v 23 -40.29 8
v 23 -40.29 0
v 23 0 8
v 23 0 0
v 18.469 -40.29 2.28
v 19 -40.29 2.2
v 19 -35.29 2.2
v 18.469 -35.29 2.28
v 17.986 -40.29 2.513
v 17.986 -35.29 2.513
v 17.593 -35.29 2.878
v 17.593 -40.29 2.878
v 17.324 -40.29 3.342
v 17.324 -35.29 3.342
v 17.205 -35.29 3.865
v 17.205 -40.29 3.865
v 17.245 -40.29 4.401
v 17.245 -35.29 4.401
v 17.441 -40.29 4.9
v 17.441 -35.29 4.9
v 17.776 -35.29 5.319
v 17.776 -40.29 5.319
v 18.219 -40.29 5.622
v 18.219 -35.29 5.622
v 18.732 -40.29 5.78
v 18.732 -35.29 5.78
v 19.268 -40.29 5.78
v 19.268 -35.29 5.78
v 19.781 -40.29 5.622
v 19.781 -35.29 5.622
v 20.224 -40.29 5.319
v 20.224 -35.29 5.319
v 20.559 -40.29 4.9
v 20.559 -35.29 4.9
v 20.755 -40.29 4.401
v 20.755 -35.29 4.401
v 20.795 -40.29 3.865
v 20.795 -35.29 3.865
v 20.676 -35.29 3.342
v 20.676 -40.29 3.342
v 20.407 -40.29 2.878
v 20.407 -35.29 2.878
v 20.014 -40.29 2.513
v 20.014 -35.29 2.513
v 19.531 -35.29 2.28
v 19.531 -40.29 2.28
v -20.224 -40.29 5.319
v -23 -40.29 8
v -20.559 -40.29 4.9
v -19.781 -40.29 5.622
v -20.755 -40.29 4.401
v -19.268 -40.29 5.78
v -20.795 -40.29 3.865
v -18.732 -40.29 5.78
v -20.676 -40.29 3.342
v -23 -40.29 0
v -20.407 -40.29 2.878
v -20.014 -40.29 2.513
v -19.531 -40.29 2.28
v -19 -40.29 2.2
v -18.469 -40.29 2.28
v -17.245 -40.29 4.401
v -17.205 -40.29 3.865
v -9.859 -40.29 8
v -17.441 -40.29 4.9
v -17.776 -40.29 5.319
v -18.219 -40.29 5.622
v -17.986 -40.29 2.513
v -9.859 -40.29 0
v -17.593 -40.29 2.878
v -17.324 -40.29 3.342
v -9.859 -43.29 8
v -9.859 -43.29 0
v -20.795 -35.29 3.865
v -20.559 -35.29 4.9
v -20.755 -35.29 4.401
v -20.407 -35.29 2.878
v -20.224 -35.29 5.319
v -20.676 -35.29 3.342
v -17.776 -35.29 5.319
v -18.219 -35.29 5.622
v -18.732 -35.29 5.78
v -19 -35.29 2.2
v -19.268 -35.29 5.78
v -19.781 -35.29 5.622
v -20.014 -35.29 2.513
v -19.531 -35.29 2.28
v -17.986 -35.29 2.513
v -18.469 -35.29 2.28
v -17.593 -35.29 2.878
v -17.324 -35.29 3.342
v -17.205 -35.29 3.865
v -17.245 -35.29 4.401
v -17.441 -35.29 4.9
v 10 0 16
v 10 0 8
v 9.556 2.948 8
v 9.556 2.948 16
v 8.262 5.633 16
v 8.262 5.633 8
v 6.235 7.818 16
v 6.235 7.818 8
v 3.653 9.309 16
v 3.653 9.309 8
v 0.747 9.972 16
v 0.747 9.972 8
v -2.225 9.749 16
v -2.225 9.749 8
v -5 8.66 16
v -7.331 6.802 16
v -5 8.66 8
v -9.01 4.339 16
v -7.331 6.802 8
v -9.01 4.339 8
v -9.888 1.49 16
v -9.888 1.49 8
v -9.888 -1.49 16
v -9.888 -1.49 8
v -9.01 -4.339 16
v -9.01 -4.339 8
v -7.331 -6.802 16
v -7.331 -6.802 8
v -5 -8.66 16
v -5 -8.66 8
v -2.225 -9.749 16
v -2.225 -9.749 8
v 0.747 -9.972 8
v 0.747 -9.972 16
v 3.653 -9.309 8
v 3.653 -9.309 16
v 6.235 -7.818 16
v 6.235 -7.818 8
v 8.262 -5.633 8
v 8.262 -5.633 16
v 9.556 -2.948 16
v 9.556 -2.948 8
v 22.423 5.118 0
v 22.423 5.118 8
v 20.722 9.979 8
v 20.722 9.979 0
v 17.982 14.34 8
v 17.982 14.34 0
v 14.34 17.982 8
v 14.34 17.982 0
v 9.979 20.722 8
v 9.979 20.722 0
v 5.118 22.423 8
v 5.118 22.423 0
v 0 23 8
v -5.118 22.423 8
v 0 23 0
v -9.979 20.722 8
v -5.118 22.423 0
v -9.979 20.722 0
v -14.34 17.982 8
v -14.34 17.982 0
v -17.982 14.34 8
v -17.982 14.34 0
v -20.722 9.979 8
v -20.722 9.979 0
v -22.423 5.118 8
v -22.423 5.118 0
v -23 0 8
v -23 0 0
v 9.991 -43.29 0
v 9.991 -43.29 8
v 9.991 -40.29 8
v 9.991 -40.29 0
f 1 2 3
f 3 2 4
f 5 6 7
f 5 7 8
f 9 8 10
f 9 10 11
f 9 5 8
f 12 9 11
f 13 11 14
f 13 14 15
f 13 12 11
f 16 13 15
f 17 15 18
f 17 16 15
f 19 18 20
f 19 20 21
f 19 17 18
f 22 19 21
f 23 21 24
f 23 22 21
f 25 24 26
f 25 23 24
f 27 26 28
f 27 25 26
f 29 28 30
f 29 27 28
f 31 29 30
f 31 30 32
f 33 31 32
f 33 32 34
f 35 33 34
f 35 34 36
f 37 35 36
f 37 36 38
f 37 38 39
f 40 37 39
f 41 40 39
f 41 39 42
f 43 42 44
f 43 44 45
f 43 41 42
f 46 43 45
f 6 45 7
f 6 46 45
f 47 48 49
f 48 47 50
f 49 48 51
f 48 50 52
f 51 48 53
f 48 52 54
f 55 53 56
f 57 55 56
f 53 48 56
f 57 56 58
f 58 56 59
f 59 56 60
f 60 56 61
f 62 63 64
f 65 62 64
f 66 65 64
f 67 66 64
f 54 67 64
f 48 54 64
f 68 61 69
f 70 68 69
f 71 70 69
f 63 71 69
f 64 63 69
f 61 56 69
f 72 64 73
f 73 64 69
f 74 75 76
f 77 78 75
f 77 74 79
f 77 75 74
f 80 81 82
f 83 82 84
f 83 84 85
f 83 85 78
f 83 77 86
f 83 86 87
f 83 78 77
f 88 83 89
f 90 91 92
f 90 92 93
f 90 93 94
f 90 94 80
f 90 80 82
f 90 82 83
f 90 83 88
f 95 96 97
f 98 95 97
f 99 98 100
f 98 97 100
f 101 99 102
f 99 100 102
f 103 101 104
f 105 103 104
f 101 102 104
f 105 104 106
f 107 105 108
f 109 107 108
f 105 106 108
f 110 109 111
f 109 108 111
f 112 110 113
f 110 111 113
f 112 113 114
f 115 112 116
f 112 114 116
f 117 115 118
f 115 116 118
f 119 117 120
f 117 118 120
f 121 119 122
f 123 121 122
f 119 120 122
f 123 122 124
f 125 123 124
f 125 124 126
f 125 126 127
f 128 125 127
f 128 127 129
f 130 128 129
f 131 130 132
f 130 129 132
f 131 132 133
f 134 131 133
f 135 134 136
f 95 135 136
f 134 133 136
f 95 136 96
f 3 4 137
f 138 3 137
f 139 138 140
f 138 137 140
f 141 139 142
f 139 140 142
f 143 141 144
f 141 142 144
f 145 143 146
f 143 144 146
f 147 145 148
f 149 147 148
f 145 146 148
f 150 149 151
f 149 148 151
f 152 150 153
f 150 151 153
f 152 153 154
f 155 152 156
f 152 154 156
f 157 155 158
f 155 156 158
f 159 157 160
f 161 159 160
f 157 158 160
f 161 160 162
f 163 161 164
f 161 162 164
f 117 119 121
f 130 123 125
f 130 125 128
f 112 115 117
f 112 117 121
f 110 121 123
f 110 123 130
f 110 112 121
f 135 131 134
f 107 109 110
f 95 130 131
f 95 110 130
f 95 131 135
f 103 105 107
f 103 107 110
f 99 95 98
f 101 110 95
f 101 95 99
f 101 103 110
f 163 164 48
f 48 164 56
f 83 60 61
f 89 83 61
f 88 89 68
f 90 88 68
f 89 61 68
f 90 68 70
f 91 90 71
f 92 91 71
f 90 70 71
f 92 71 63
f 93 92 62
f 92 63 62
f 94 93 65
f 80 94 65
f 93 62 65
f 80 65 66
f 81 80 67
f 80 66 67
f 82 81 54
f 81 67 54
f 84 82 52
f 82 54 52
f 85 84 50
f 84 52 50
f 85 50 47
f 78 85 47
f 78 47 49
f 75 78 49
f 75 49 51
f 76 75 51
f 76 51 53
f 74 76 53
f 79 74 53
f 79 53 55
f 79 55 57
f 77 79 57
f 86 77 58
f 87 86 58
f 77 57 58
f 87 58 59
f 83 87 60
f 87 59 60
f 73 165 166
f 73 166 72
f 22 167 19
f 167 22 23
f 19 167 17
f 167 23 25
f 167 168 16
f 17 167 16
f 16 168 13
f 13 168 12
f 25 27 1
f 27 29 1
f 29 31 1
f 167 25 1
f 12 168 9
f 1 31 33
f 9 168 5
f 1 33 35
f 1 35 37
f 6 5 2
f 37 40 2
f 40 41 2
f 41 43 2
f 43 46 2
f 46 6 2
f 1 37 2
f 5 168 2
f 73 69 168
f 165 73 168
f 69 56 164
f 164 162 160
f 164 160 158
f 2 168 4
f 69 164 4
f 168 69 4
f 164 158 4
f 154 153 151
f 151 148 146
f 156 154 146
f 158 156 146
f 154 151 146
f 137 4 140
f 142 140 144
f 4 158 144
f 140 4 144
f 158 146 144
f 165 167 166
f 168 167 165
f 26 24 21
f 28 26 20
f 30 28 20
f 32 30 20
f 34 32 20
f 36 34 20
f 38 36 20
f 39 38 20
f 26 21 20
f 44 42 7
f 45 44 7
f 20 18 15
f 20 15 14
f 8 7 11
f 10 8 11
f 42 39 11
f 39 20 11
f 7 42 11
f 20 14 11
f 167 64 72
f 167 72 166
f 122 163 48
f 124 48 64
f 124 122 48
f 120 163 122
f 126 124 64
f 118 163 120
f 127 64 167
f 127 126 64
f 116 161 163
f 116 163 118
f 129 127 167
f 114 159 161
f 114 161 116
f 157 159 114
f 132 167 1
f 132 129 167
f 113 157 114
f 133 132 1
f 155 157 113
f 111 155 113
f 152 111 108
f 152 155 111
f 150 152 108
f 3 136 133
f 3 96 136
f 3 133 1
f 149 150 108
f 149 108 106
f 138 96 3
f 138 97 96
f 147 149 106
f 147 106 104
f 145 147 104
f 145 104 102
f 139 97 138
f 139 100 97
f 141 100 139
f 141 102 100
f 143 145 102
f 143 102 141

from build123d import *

# Parameters (mm, degrees)
EXTRUDE_1_DEPTH     = 8
SKETCH_2_R          = 10
EXTRUDE_2_DEPTH     = 8
SKETCH_3_W          = 19.850439241
SKETCH_3_H          = 8
EXTRUDE_3_DEPTH     = 3
SKETCH_4_R          = 1.8
CUT_EXTRUDE_1_DEPTH = 5


with BuildPart() as part:
    # 草图1 → 凸台-拉伸1 (new body)
    with BuildSketch(Plane.XY):
        with BuildLine():
            Line((-23, 0), (-23, -40.29))
            Line((-23, -40.29), (23, -40.29))
            Line((23, -40.29), (23, 0))
            ThreePointArc((23, 0), (0, 23), (-23, 0))
        make_face()
    extrude(amount=EXTRUDE_1_DEPTH)

    # 草图2 → 凸台-拉伸2 (add)
    with BuildSketch(Plane.XY.offset(8)):
        Circle(SKETCH_2_R)
    extrude(amount=EXTRUDE_2_DEPTH)

    # 草图3 → 凸台-拉伸3 (add)
    with BuildSketch(Plane(origin=(0, -40.29, 0), x_dir=(-1, 0, 0), z_dir=(0, -1, 0))):
        with Locations((-0.065968244, -4)):
            Rectangle(SKETCH_3_W, SKETCH_3_H)
    extrude(amount=EXTRUDE_3_DEPTH)

    # 草图4 → 切除-拉伸1 (cut)
    with BuildSketch(Plane(origin=(0, -40.29, 0), x_dir=(-1, 0, 0), z_dir=(0, -1, 0))):
        with Locations((19, -4)):
            Circle(SKETCH_4_R)
    cut_extrude_1 = extrude(amount=-CUT_EXTRUDE_1_DEPTH, mode=Mode.SUBTRACT)

    # 镜向1: 切除-拉伸1 across plane
    add(cut_extrude_1.mirror(Plane.ZY), mode=Mode.SUBTRACT)


solid = part.part
